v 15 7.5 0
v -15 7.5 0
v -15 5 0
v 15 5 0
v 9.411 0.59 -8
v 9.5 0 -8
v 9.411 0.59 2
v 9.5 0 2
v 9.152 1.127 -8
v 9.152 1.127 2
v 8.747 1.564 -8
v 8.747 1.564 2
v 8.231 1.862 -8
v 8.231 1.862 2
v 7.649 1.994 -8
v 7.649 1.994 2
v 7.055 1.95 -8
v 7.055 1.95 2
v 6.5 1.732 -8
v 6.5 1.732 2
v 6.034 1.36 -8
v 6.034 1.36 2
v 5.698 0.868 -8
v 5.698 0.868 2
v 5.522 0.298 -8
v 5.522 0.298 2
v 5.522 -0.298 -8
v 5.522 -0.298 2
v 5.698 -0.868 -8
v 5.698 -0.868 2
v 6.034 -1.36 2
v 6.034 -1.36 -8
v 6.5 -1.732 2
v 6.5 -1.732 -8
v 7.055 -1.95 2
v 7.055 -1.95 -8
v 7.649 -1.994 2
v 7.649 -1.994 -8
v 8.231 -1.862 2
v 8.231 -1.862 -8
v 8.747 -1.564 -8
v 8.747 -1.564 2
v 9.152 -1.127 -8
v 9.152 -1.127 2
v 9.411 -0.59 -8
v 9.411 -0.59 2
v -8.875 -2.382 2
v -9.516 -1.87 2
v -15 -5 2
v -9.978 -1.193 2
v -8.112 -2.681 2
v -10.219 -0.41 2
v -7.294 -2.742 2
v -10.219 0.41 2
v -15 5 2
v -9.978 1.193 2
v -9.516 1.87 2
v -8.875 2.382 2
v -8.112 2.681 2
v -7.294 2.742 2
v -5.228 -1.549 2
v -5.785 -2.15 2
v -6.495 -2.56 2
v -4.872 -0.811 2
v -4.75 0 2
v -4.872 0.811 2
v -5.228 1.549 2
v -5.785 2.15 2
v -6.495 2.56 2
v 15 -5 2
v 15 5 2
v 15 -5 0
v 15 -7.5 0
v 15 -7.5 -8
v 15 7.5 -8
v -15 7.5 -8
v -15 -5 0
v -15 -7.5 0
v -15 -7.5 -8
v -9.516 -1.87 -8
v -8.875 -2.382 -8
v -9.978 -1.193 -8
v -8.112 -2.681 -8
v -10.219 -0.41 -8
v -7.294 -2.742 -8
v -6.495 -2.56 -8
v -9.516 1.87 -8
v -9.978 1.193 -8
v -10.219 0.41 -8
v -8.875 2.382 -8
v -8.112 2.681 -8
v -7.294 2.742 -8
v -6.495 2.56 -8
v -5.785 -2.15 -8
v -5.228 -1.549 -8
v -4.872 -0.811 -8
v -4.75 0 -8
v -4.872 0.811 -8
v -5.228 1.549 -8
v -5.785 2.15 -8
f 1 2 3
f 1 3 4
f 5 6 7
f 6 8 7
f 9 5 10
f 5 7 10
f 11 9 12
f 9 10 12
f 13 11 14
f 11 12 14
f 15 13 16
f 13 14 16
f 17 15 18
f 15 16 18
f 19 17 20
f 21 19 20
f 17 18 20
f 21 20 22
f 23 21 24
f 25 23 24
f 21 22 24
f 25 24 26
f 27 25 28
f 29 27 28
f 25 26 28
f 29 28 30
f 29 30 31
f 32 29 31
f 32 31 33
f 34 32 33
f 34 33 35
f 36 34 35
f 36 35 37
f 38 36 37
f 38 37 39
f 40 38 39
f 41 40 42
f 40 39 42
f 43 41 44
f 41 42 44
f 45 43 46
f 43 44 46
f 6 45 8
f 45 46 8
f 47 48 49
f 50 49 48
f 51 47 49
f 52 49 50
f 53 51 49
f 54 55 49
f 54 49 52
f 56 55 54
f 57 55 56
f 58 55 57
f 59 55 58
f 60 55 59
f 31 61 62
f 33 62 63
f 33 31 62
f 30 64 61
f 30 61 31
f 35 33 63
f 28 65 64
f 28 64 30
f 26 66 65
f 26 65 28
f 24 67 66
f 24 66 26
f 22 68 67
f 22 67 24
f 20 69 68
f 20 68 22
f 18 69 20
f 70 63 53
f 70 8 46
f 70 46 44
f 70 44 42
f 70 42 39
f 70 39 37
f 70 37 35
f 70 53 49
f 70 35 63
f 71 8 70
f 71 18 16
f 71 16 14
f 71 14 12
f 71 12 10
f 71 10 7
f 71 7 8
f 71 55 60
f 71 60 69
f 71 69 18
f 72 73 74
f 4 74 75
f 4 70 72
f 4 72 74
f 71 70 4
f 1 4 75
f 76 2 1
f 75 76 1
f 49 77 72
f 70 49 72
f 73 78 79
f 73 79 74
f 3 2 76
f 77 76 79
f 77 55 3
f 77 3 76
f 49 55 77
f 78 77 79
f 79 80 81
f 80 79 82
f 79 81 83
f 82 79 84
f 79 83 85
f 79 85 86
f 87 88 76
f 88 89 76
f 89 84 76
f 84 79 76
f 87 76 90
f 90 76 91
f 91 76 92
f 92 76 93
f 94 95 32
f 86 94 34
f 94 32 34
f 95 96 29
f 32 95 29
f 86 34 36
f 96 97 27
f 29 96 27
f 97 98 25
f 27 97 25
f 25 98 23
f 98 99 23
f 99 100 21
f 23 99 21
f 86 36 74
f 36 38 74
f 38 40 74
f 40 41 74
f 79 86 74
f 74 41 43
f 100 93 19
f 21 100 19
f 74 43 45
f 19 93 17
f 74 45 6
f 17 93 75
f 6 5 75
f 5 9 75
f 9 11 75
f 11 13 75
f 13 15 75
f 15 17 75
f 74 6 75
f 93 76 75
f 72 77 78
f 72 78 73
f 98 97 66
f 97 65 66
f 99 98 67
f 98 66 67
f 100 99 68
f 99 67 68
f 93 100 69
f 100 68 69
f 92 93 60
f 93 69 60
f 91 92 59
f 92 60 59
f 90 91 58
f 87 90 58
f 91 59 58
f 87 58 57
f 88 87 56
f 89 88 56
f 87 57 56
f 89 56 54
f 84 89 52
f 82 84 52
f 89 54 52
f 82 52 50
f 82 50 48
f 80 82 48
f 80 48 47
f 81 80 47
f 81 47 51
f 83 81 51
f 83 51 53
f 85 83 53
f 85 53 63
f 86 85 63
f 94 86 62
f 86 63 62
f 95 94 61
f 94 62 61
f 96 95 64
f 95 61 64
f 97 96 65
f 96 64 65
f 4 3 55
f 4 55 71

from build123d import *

# Parameters (mm, degrees)
F0_W          = 30
F0_H          = 10
F1_DEPTH      = 2
F0_H_2        = 2.5
F2_DEPTH      = 8
F3_R          = 2.75
F3_R_2        = 2
F4_DEPTH      = 25
F4_DEPTH_BACK = 25


with BuildPart() as f1:
    # F0 (on Top) → F1 (new body)
    with BuildSketch(Plane.XY):
        Rectangle(F0_W, F0_H)
    extrude(amount=F1_DEPTH)

    # F0 (on Top) → F2 (join)
    with BuildSketch(Plane.XY):
        with Locations((0, -6.25)):
            Rectangle(F0_W, F0_H_2)
        Rectangle(F0_W, F0_H)
        with Locations((0, 6.25)):
            Rectangle(F0_W, F0_H_2)
    extrude(amount=-F2_DEPTH)

    # F3 (on Top) → F4 (cut, two sides)
    with BuildSketch(Plane.XY) as f4_sk:
        with Locations((-7.5, 0)):
            Circle(F3_R)
        with Locations((7.5, 0)):
            Circle(F3_R_2)
    extrude(amount=F4_DEPTH, mode=Mode.SUBTRACT)
    extrude(f4_sk.sketch, amount=-F4_DEPTH_BACK, mode=Mode.SUBTRACT)


solid = f1.part
